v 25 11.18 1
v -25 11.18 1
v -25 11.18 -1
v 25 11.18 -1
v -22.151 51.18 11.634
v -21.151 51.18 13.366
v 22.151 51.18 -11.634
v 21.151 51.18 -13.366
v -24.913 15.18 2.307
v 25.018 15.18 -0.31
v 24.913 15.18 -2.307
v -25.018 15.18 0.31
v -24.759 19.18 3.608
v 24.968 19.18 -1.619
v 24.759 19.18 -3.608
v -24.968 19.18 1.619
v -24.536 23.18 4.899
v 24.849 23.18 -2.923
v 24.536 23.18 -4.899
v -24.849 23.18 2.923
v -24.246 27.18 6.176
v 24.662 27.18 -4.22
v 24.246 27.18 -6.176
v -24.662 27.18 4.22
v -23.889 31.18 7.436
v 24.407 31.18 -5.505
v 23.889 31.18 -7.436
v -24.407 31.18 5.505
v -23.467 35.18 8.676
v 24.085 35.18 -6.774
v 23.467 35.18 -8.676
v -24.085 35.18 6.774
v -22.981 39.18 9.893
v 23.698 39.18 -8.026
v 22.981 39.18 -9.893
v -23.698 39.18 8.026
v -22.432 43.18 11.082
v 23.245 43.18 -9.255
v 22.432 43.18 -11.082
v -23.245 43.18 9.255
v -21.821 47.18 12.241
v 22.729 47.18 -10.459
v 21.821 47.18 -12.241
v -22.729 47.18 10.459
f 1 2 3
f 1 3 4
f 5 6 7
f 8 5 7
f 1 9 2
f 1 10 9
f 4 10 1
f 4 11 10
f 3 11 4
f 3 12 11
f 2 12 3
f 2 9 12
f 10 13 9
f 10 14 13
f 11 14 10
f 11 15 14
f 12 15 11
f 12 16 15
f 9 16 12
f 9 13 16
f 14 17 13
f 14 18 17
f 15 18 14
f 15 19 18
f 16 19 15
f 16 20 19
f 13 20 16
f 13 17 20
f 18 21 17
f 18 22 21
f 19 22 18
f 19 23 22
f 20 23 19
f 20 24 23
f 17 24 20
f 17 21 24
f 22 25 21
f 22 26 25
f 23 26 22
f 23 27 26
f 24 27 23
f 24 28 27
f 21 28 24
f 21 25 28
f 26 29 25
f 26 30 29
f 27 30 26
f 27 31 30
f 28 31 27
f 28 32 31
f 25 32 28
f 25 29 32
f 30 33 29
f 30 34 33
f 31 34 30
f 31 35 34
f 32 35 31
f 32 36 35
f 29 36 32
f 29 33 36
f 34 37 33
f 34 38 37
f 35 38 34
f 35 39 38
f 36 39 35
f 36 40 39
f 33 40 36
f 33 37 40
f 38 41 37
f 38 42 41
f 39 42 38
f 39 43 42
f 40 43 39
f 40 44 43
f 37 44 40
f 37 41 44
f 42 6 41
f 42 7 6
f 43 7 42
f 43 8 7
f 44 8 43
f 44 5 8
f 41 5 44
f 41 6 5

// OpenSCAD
module fan_wheel(
    outer_radius = 55,
    inner_radius = 15,
    blade_count = 8,
    outer_width = 50,
    inner_width = 20,
    thickness = 2,
    twist = -30,
    angle_of_attack = 45,
) {
    
    module blade() {
        
        inner_height = cos( asin( inner_width / ( 2 * inner_radius ) )) * inner_radius;
        
        blade_height = outer_radius - inner_radius;
        
        translate( [ 0, inner_height, 0 ])
        rotate( [-90, 0, 0 ] )
        linear_extrude(
            height = blade_height,
            twist = twist,
            slices = 10,
            convexity = 10
        )
        square( [outer_width, thickness], center = true);
    }
    
    blade(); // debug
}

fan_wheel();
